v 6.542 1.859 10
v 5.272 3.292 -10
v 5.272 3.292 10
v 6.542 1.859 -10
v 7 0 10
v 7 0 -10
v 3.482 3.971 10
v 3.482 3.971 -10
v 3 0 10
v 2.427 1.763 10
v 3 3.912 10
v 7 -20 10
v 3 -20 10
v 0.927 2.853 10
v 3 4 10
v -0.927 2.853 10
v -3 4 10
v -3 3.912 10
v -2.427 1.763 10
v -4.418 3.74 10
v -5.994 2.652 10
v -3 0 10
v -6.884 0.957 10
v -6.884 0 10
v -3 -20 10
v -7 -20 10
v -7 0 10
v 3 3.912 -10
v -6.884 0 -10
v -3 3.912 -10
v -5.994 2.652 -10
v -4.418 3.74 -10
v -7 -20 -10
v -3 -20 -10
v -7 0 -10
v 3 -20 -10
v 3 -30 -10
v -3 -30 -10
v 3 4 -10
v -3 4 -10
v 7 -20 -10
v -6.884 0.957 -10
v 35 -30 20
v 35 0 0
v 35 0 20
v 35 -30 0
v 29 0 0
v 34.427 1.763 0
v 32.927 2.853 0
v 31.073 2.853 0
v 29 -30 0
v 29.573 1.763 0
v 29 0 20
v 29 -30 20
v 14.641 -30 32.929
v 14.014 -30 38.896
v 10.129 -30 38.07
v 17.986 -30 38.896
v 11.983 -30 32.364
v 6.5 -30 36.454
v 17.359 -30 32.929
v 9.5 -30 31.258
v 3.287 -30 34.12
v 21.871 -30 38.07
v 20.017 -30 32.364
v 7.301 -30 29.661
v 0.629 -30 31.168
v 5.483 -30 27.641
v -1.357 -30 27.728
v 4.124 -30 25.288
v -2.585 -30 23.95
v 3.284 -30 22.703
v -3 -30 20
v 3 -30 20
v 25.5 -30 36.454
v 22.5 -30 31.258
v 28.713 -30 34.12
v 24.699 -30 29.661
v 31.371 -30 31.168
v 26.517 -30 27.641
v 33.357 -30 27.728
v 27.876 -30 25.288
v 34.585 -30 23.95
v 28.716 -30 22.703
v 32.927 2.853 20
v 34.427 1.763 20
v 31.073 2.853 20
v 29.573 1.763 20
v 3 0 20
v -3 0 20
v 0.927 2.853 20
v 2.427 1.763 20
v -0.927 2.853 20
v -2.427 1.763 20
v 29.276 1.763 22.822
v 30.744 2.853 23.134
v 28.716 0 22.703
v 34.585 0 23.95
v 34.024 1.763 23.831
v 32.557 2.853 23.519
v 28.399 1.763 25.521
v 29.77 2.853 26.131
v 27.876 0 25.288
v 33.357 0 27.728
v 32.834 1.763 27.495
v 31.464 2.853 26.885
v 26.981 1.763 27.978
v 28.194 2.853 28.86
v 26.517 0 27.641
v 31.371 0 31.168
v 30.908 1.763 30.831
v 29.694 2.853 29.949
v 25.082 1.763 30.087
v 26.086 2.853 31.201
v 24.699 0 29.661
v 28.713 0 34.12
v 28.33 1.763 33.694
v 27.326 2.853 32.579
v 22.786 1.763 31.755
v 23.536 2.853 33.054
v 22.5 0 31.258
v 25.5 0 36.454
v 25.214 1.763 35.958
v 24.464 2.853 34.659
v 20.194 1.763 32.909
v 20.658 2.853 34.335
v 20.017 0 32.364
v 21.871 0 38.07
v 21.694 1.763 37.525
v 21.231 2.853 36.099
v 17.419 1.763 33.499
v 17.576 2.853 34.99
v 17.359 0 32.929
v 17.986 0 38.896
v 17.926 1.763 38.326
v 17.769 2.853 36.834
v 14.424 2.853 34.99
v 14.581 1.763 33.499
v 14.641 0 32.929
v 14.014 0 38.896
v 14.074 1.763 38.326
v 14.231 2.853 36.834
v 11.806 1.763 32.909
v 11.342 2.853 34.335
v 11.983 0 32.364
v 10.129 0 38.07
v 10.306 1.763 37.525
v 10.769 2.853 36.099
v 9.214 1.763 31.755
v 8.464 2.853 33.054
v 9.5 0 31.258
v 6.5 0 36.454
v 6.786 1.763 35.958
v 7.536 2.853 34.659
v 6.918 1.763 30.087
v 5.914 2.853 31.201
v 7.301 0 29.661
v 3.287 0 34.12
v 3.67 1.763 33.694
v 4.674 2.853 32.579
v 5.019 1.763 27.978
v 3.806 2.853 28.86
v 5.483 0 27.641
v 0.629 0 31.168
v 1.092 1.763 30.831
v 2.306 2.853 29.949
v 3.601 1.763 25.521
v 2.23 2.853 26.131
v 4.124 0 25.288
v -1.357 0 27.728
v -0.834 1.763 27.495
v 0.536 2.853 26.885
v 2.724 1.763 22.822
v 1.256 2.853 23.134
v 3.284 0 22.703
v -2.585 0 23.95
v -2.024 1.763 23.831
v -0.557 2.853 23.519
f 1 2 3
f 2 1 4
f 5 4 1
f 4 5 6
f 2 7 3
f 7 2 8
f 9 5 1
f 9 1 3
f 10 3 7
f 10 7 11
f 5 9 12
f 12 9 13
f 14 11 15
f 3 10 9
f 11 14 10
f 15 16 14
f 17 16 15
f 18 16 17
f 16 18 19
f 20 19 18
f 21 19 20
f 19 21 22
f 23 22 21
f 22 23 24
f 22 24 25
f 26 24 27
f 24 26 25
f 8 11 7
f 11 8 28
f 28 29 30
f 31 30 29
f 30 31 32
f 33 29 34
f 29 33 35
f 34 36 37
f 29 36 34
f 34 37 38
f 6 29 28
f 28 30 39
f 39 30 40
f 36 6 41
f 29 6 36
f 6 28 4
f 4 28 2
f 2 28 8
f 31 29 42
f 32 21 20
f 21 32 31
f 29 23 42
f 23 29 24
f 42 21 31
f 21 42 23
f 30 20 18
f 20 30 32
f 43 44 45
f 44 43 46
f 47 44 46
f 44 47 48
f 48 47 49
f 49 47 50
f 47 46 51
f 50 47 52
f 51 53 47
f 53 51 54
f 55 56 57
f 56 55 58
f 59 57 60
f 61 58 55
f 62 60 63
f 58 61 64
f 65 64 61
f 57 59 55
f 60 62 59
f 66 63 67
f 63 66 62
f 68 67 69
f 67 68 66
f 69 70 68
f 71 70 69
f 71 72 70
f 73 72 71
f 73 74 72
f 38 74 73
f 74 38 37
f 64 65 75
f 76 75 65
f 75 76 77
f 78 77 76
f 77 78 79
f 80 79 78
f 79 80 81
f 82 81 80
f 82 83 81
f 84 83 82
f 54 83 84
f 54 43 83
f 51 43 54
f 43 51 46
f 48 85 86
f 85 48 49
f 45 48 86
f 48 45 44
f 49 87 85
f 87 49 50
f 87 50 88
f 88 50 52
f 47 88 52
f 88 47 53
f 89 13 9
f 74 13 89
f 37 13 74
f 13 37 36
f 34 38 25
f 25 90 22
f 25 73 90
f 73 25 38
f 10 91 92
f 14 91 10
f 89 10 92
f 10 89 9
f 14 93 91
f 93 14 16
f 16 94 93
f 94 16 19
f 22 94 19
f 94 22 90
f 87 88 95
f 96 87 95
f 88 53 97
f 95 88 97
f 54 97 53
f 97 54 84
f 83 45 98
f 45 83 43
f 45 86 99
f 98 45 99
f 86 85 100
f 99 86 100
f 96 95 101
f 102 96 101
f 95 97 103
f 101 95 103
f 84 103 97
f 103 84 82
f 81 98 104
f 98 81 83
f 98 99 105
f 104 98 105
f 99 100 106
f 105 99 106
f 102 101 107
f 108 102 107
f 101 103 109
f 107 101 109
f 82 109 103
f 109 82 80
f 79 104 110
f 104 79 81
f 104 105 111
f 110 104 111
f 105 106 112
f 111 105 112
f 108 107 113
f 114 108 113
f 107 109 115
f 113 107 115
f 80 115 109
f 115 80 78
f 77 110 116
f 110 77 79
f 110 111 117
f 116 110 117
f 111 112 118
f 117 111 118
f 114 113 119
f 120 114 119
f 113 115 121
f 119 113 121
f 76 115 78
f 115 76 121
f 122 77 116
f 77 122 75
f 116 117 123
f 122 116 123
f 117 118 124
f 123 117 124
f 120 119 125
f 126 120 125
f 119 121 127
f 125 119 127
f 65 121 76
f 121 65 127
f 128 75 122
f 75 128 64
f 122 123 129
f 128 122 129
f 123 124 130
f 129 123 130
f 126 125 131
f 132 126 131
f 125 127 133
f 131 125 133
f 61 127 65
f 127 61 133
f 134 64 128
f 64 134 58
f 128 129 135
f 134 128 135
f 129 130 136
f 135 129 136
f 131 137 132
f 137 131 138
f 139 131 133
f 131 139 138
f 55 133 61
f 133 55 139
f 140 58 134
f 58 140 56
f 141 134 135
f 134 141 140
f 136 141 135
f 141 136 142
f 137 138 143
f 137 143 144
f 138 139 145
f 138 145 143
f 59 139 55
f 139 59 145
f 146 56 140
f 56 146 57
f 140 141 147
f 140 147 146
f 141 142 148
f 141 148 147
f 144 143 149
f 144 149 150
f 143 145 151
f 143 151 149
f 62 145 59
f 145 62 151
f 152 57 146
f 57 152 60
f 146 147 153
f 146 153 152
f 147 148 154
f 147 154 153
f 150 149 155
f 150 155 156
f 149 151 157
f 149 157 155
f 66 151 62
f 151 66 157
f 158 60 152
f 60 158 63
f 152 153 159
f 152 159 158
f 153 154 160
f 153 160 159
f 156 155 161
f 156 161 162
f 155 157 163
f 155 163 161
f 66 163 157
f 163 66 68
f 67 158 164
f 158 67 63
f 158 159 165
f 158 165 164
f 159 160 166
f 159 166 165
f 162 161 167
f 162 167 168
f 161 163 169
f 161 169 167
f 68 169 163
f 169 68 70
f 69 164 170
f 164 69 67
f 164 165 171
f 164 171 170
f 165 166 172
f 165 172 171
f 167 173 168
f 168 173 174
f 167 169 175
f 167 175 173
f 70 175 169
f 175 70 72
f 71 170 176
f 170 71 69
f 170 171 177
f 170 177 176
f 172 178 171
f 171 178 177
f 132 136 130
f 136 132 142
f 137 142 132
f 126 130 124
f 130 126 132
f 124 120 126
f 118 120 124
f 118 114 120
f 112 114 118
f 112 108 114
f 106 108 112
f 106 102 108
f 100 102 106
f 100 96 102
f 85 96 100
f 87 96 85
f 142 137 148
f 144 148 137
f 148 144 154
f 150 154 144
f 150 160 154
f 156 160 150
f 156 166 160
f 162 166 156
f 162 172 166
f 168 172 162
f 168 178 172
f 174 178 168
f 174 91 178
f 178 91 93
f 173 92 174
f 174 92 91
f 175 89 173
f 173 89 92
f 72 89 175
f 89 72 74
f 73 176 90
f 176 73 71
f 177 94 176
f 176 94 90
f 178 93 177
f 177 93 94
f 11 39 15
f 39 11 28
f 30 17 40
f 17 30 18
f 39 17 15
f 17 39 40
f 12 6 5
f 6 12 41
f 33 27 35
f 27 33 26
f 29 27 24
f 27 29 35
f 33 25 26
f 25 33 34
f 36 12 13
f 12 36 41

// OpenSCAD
// file: Cord.scad
// Library: Cord.scad
// Version: 1.0.0
// Author: David Bowers
// Copyright: 2022
// License: 2-clause BSD License (http://opensource.org/licenses/BSD-2-Clause)

// cord(
//  straight_section,
//  curve_radius,
//  cord_thickness,
//  degree_of_curve,
//  tail_section
// );

// EXAMPLE USAGE:
// cord();

// the tail and the start should be their own pieces
module cord(
    straight_section = 30,
    curve_radius = 20,
    cord_thickness = 6,
    degree_of_curve = 180,
    tail_section = 30
)
{
    translate([0, 0, abs(straight_section/2-tail_section/2)]){
        translate([0, -15, 0])
            cube(
                [cord_thickness, 
                30, 
                tail_section], 
                center=true
            );
        cylinder(
            h = tail_section, 
            d = cord_thickness, 
            center = true);
    }
    translate([-curve_radius,0,straight_section/2]){
        rotate([90,0,0]){
            rotate_extrude(angle=degree_of_curve){
                translate([curve_radius,0])
                    circle(d=cord_thickness);
                translate([curve_radius, 15])
                    square([cord_thickness, 30],                center = true);   
            }
        }
    }
    translate([-curve_radius*2, 0, 0]){
        translate([0, -15, 0])
        cube(
            [cord_thickness, 
            30, 
            straight_section], 
            center=true
            );
        cylinder(
        h = straight_section, 
        d = cord_thickness, 
        center = true
            );
    }
          
}

cord();
// main file
// Library: usbCPlug.scad
// Version: 1.0.0
// Author: David Bowers
// Copyright: 2022
// License: 2-clause BSD License (http://opensource.org/licenses/BSD-2-Clause)

// For print resolution
//$fa = 1;
//$fs = 0.4;

use <./Cord.scad>

cord_radius = 16;
plug_length = 20;

function get_cord_radius() = cord_radius;
function get_plug_length() = plug_length;

module usbCPlug(
    length = plug_length,
    width = 14,
    depth = 8,
    cord_rad = cord_radius
    )
    {
        centerline = (width - depth)/2;
        for (i = [1, -1]){
            translate([i * centerline, 0, 0]){
                cylinder(h = length, d = depth, center = true);
            }
        }
        cube([width - depth, depth, length], center = true);
        translate([0,-10,0])
        cube([width, 20, length], center = true);
        translate([cord_rad*2,0,5])
        cord(
            straight_section = 30,
            curve_radius = cord_rad,
            cord_thickness = 6,
            degree_of_curve = 180,
            tail_section = 20
            );
    }
    
    usbCPlug();
    
